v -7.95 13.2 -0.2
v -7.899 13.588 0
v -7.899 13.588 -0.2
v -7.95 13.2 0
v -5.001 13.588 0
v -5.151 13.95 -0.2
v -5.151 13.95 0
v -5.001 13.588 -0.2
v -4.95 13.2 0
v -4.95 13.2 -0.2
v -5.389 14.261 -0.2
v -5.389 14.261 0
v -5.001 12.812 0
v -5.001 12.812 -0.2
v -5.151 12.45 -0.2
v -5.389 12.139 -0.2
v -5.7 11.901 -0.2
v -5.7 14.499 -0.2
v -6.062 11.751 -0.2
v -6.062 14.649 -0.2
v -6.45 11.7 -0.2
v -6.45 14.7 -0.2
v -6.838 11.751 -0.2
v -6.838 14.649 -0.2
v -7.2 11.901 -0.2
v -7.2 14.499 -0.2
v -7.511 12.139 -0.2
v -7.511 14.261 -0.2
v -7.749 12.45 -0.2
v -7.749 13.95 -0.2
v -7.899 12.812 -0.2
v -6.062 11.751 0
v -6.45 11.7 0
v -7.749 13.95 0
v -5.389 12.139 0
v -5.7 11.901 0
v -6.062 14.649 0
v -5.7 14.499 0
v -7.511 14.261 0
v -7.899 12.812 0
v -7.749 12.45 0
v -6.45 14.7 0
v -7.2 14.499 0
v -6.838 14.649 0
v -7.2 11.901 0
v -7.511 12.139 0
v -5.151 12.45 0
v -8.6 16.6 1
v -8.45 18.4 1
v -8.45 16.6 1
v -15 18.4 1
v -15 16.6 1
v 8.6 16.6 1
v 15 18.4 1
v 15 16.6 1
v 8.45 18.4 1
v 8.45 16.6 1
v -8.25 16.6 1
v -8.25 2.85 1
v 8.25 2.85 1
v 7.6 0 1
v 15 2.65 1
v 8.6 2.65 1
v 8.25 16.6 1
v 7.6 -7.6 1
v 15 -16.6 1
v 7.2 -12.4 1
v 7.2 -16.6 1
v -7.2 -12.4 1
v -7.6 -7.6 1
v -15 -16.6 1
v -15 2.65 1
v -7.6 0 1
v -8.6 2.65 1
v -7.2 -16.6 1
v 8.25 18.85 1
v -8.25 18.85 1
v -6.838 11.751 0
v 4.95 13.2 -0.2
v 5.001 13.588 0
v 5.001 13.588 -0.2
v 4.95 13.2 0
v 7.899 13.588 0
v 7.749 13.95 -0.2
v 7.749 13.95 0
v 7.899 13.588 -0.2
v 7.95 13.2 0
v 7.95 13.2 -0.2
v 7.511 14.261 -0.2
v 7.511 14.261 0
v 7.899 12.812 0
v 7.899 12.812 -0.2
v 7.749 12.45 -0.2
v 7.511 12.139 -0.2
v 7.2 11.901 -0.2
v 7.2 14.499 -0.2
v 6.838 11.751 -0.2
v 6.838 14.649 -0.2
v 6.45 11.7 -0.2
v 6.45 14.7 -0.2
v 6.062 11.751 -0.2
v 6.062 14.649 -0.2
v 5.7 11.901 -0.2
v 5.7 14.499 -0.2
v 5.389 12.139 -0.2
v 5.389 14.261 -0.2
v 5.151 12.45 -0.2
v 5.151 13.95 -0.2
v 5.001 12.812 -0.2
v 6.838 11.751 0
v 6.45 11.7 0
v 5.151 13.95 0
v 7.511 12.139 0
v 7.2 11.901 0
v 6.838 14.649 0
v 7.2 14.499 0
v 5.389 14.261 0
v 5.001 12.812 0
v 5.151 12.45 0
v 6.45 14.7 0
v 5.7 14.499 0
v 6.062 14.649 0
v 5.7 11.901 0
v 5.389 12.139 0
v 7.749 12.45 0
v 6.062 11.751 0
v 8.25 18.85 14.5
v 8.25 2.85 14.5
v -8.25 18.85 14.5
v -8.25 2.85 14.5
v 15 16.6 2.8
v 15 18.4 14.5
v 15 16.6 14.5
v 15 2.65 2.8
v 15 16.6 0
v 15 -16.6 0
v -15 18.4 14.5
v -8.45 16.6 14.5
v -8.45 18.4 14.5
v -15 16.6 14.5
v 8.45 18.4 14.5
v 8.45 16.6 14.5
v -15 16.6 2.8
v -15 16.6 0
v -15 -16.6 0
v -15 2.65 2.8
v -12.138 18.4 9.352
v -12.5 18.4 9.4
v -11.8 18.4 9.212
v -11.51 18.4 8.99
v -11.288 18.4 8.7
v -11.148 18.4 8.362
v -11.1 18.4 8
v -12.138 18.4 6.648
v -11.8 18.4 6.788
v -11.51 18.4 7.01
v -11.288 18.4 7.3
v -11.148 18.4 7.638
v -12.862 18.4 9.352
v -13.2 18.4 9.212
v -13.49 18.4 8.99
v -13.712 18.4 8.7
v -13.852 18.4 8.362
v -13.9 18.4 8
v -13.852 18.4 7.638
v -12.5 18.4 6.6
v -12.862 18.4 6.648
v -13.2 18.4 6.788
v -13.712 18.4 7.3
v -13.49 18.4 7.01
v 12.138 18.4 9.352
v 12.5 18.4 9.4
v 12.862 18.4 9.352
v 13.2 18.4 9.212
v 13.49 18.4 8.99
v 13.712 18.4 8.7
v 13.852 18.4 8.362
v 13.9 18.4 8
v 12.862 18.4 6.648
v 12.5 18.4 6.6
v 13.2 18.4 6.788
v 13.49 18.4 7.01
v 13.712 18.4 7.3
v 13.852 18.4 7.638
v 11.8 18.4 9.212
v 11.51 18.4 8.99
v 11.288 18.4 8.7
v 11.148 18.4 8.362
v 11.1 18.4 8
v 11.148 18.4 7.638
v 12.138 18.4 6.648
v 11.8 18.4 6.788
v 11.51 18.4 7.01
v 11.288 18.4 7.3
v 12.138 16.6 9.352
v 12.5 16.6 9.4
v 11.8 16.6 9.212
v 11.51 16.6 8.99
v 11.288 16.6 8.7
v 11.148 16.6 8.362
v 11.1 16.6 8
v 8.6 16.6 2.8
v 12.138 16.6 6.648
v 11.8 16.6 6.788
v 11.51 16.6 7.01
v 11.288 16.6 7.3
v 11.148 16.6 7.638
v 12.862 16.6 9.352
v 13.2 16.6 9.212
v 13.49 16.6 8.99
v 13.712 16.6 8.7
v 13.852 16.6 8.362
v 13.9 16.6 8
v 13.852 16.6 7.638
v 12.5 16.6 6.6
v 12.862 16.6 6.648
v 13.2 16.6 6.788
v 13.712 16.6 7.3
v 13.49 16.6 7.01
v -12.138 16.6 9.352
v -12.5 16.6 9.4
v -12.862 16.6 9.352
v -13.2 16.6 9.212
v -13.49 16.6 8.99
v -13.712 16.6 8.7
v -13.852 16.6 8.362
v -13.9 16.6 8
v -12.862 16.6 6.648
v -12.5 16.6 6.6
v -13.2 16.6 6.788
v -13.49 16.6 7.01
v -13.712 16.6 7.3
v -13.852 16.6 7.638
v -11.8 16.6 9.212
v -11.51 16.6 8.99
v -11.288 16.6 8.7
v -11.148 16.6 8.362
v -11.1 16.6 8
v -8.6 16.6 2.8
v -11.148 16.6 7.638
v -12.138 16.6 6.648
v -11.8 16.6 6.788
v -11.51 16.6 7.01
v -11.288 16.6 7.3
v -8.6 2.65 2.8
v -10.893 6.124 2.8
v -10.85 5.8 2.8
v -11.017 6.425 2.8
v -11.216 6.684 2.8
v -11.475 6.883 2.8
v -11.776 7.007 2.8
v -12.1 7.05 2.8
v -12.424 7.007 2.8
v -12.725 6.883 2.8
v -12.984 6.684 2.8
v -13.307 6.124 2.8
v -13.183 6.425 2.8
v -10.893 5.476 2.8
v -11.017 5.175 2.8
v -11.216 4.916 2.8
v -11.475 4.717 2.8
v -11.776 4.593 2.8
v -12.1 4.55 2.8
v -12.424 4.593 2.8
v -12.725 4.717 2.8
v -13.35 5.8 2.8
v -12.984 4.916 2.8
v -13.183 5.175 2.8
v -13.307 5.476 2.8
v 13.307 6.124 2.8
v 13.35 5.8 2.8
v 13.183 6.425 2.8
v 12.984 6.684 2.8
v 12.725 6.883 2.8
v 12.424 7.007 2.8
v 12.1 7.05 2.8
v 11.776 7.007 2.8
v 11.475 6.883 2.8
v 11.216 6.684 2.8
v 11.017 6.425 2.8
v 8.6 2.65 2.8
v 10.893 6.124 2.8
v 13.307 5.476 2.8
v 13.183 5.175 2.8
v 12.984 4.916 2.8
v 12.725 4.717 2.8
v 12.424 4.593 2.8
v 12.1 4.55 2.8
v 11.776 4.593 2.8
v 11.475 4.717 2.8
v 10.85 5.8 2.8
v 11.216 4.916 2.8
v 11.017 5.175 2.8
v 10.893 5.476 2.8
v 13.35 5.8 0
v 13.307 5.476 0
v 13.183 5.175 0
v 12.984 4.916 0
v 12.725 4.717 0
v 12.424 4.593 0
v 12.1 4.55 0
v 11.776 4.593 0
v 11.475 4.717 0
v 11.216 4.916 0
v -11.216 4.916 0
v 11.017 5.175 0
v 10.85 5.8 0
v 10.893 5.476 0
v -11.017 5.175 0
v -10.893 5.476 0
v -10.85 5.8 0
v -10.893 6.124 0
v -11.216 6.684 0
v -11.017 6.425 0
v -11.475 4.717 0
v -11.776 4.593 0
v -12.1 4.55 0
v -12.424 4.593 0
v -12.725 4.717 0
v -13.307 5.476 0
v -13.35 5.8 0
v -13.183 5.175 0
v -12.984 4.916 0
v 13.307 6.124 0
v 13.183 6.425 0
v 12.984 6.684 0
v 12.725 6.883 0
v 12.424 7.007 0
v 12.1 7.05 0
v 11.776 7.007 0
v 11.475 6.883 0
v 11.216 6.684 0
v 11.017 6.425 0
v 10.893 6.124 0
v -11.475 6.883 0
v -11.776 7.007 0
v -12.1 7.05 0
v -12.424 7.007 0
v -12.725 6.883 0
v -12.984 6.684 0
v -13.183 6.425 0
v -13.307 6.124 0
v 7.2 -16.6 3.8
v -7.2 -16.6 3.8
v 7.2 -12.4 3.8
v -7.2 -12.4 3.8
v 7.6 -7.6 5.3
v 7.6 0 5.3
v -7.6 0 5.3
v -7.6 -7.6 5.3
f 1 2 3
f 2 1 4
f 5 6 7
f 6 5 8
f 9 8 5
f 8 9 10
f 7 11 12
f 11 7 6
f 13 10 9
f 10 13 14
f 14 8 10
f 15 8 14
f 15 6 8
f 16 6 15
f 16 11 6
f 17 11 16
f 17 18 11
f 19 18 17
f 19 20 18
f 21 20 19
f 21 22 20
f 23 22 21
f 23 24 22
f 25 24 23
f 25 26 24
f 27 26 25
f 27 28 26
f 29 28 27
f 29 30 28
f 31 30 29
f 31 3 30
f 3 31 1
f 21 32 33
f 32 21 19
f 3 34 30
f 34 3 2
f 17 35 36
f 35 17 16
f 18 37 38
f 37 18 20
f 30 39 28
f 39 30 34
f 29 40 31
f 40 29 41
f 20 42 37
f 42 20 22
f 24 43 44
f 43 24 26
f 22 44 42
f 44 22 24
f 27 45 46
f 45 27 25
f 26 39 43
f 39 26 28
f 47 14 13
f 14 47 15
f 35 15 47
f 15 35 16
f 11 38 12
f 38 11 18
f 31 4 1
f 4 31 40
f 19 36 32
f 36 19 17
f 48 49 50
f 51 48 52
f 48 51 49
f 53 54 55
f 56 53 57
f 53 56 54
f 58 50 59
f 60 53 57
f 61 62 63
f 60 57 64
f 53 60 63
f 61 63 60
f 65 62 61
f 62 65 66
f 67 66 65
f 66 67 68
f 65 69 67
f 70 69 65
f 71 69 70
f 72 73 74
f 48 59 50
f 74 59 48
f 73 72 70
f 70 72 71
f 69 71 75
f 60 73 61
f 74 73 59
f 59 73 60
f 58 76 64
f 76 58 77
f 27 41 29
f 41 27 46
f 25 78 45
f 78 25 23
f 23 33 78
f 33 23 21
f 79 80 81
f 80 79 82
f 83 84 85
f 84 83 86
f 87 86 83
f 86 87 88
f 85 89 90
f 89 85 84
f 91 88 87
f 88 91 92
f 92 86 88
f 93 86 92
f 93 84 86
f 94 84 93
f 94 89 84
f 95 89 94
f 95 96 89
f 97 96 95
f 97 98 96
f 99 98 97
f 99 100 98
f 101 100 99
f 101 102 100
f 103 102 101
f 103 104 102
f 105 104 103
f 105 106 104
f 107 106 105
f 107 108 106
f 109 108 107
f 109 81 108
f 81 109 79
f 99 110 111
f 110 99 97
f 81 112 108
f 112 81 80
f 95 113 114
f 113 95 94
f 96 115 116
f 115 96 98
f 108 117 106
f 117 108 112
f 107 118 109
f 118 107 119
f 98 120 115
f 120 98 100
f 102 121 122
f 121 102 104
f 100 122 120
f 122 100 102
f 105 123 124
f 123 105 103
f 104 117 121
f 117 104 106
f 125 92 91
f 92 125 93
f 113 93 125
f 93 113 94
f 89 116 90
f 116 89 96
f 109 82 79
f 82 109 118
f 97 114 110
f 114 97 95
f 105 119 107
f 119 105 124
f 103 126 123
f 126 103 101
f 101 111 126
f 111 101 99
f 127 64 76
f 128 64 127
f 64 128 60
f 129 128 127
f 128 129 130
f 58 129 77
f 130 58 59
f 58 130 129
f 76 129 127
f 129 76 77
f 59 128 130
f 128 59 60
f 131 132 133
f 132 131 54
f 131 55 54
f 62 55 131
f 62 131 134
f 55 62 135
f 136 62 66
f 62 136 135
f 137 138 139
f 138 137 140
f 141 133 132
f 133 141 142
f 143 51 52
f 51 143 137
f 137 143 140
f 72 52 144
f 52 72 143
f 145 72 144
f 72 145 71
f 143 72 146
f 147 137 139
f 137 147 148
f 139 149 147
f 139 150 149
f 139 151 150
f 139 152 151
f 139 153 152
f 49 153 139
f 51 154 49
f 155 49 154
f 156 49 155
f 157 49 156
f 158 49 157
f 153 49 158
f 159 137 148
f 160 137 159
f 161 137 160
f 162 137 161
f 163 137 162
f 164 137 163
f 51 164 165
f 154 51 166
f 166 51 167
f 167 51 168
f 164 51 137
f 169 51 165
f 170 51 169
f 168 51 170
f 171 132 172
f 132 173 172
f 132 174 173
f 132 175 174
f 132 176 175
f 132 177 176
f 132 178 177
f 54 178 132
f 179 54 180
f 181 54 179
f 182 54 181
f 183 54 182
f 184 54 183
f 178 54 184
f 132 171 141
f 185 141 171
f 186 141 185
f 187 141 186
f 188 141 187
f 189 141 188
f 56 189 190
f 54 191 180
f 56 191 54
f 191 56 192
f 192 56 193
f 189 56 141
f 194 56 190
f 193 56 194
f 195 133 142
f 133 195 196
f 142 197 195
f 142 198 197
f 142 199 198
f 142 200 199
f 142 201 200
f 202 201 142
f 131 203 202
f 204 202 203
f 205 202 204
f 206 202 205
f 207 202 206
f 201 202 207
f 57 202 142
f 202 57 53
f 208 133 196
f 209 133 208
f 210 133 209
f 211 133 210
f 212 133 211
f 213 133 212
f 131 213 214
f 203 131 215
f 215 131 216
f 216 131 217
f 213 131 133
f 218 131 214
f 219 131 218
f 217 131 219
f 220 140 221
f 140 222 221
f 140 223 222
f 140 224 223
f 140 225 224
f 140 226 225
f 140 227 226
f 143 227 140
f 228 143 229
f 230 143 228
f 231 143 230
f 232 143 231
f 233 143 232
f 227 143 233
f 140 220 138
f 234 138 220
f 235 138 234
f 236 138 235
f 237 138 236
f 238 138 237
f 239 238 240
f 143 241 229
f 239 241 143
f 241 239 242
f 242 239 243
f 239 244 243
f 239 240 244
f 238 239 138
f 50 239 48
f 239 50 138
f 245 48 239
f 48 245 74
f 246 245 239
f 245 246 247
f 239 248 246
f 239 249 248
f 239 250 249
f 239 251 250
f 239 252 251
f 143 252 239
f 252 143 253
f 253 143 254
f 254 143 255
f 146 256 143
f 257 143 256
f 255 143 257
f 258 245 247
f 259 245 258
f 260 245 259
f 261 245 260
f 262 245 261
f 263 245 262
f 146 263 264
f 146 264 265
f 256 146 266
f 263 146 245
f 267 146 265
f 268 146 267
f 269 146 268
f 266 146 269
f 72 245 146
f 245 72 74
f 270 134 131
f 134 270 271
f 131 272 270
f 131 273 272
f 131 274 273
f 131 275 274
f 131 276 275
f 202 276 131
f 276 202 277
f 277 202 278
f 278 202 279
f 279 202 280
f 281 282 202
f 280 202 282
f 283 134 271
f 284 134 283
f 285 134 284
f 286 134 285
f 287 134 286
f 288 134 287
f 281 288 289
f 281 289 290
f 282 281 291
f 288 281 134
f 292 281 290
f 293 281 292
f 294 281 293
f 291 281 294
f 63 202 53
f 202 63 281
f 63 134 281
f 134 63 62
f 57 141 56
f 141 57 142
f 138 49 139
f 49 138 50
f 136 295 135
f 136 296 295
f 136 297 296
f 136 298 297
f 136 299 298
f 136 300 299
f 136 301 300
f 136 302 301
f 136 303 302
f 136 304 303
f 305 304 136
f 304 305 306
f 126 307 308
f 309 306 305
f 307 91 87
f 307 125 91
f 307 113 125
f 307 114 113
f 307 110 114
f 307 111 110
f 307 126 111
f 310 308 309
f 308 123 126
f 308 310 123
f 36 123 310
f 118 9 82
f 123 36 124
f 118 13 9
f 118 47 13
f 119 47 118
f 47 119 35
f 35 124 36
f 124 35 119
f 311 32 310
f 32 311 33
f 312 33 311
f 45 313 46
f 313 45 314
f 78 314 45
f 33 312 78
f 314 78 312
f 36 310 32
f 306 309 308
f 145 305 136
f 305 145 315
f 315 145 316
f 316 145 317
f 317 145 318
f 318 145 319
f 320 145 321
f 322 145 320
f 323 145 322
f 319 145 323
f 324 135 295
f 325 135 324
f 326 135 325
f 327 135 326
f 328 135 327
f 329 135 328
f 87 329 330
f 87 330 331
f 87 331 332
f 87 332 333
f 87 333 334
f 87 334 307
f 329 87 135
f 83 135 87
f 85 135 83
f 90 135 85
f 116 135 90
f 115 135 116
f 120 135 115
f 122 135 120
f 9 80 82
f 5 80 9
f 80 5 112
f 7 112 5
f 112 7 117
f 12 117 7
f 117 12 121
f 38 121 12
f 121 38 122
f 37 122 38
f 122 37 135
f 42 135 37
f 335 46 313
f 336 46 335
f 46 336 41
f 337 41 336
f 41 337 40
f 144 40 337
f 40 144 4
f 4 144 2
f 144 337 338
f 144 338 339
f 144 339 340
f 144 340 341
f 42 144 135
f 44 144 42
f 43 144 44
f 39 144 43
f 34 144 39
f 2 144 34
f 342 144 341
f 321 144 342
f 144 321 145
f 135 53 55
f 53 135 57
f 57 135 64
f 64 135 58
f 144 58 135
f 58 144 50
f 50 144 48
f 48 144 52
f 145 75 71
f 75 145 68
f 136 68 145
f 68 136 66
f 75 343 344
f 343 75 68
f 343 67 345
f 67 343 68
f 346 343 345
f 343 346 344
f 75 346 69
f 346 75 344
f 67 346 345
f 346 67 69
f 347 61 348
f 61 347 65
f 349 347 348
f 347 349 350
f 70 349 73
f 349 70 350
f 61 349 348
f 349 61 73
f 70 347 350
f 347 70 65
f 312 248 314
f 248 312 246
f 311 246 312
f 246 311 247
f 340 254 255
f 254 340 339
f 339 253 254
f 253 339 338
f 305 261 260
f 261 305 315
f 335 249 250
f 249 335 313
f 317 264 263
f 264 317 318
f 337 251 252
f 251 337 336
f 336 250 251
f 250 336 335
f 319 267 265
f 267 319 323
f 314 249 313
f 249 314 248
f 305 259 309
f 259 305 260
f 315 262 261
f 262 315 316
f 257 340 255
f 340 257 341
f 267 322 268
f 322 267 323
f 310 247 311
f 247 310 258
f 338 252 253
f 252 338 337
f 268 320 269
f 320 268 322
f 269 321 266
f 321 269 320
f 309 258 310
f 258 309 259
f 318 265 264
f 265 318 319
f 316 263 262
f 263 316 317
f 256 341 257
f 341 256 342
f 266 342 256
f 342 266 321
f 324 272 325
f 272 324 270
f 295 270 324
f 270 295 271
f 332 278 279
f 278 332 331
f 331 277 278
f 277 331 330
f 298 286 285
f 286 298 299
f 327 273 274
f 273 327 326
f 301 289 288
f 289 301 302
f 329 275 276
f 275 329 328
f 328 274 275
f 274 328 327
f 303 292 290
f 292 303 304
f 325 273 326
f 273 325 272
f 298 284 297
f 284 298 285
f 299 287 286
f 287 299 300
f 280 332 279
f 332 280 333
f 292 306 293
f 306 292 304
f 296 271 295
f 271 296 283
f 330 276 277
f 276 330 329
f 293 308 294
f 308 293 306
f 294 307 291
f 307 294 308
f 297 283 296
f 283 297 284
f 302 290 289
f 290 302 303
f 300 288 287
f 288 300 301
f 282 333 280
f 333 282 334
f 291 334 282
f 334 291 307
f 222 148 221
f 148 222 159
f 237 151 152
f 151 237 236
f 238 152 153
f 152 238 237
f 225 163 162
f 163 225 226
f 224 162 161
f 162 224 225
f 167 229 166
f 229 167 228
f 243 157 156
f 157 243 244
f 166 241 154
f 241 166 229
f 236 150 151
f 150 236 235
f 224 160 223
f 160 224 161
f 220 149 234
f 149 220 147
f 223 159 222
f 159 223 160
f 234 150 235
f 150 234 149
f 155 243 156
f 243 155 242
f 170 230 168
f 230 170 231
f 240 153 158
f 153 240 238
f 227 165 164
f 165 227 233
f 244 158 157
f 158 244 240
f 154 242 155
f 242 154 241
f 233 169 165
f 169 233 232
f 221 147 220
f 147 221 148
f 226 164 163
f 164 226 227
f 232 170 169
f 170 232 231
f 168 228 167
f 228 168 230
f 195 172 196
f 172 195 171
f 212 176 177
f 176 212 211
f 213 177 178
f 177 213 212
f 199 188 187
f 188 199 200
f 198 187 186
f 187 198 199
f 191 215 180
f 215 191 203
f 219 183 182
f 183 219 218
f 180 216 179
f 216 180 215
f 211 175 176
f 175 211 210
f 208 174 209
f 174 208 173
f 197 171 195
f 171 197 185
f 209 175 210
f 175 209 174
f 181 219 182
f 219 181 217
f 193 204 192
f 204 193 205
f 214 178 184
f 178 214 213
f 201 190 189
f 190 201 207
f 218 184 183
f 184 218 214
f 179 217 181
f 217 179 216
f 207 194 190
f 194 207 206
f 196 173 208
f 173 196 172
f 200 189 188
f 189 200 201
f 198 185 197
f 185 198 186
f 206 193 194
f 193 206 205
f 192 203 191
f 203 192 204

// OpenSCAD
// file: smidge.scad
//
// Copyright (c) Stewart H. Whitman, 2020-2021.
//
// File:    smidge.scad
// Project: General
// License: CC BY-NC-SA 4.0 (Attribution-NonCommercial-ShareAlike)
// Desc:    SMIDGE constant used in preview mode.
//

// Smidge constant for rendering only (to avoid Z-axis fighting, etc.)
SMIDGE = $preview ? 0.01 : 0;
// main file
//
// Copyright (c) Stewart H. Whitman, 2024.
//
// File:    youyeetoo-nic.scad
// Project: Dell Wyse 5070 2nd Ethernet Adapter Adapter
// License: CC BY-NC-SA 4.0 (Attribution-NonCommercial-ShareAlike)
// Desc:    Mock-up of the Youyeetoo Intel i225V B3/i226 M.2 NIC
//

include <smidge.scad>;

// Youyeetoo Intel I225-V B3/I226 M.2 Daughter board layout
// Part #: IIO-ALAN4 (M.2 A+E Key 2230)
//
// N.B.: Based on various pictures, there are at least two
// different daughter boards associated with this NIC/Part:
//   - a Pulse chip + black shield /w small holes deeper on PCB
//   - a Fuwin chip + silver shield /w larger holes shallower on PCB
// This file matches the layout of the one with the Pulse chip.
//
// This NIC is an M.2 A+E 2230 with a Intel I225V/I226 2.5GB NIC
// and a daughter board connected by a small cable. The cable is
// available in various lengths from 10cm to 30cm; I used a 15cm
// cable for the Wyse 5070.
//
// It is available from the Youyeetoo store:
//   https://www.youyeetoo.com/products/25g-m2-ethernet-card?VariantsId=12274
// or Aliexpress:
//   https://www.aliexpress.com/item/3256807086898768.html
// And made for one of their SBCs.
//
// Most of values come from the measurements available
// on their site - missing items were measured. The
// components/holes are symmetric about the Y-axis (side<->side),
// so some values are calculated accordingly.
//
// The shield holes match the layout of DE-9/DE-15 (9-pin
// serial or 15-pin vga) connector, and in fact it can be
// mounted in a serial or VGA cutout with the supplied hardware.
//

// kind:
//
// Unique, for customization.
//
function nic_kind() = "youyeetoo";

// pcb thickness ~1.0mm
// pcb length (measured) X width (measured)
function nic_get_pcb_size() = [ 30, 33.2, 1.0 ];

// ethernet size [left<->right,front<->rear,top<->bottom]
// Close match: Kycon, Inc. GWLX-SMT-S988G/Y
//              https://www.digikey.com/en/products/detail/kycon-inc/GWLX-SMT-S988G-Y/10248051
// Height x Width: Drawing says 17.2x13.9 (maybe includes EMI fingers), measured about 16.5x13.5 (excluding EMI fingers)
function nic_get_ethernet_size() = [16.5,16,13.5];

// shield: thickness (including bend radius)
function nic_get_shield_thickness() = 1.8;
// shield: size
function nic_get_shield_size() = [ nic_get_pcb_size().x, nic_get_shield_thickness(), nic_get_ethernet_size().z ];
// shield hole position (25mm apart per DE-9 standard) [ left=0, bottom of pcb=0]
function _nic_get_shield_left_hole() = [ nic_get_shield_size().x/2-12.5, 7.0+nic_get_pcb_size().z ];
function _nic_get_shield_right_hole() = [ nic_get_shield_size().x/2+12.5, 7.0+nic_get_pcb_size().z ];
function nic_get_shield_holes() = [ _nic_get_shield_left_hole(), _nic_get_shield_right_hole() ];
// shield hole diameter (measures about 2.8mm)
function nic_get_shield_hole_diameter() = 2.8;
function nic_get_shield_z() = nic_get_pcb_size().z;
function nic_get_shield_center_pos() = [ nic_get_pcb_size().x/2, nic_get_shield_size().z/2+nic_get_shield_z() ];

// ethernet position is equidistant from left or right side
function _nic_get_ethernet_left_pos() = (nic_get_pcb_size().x - nic_get_ethernet_size().x)/2;
function _nic_get_ethernet_right_pos() = (nic_get_pcb_size().x + nic_get_ethernet_size().x)/2;
// N.B.... about 0.0mm between ethernet and PCB
function _nic_get_ethernet_bottom_pos() = nic_get_pcb_size().z + 0.0;
function nic_get_ethernet_center_pos() = [ (_nic_get_ethernet_left_pos()+_nic_get_ethernet_right_pos())/2, _nic_get_ethernet_bottom_pos() + nic_get_ethernet_size().z/2 ];
function nic_get_ethernet_projection() = 12.75-10.5;

// bottom hole positions [left=0, rear=0] - equidistant from both sides
function _nic_get_left_hole() = [ nic_get_pcb_size().x/2 - 24.2/2, nic_get_pcb_size().y - 10.8];
function _nic_get_right_hole() = [ nic_get_pcb_size().x/2 + 24.2/2, nic_get_pcb_size().y - 10.8];
function nic_get_bottom_holes() = [ _nic_get_left_hole(), _nic_get_right_hole() ];
// bottom hole diameter (measures about 2.5mm, diagram says 2mm - screw size)
function nic_get_bottom_hole_diameter() = 2.5;

// Layout of the nic board (PCB centered with NIC port hanging out)
module nic(transparency=1.0,center=true,with_shield=true) {
  shield_thickness = nic_get_shield_thickness();

  module hole(height,diameter) {
    translate( [0,0,-SMIDGE] ) cylinder( h = height+2*SMIDGE, d=diameter );
  } // end hole

  // pcb
  module pcb() {
    color( "green", transparency ) cube( nic_get_pcb_size() );
  } // end pcb

  // ethernet
  module ethernet() {
    // connector
    color( "silver", transparency )
      translate( [_nic_get_ethernet_left_pos(), nic_get_pcb_size().y-nic_get_ethernet_size().y+nic_get_ethernet_projection(), _nic_get_ethernet_bottom_pos()] )
        cube( nic_get_ethernet_size() );
    // nubs securing connector below bottom
    color( "black", transparency ) {
      h = _nic_get_ethernet_bottom_pos()+0.2;
      translate( [_nic_get_ethernet_left_pos()+1.8,nic_get_pcb_size().y-3.4,_nic_get_ethernet_bottom_pos()-h] ) cylinder( h=h, d=3.00 );
      translate( [_nic_get_ethernet_right_pos()-1.8,nic_get_pcb_size().y-3.4,_nic_get_ethernet_bottom_pos()-h] ) cylinder( h=h, d=3.00 );
    }
  } // end ethernet

  // shield
  module shield() {
    shield_holder    = [ 6.4, 0.2+nic_get_ethernet_size().y-nic_get_ethernet_projection(), shield_thickness ];
    shield_left_pos  = [ (nic_get_pcb_size().x-nic_get_shield_size().x)/2, nic_get_pcb_size().y, nic_get_shield_z() ];
    shield_right_pos = [ shield_left_pos.x+nic_get_shield_size().x, nic_get_pcb_size().y, nic_get_shield_z() ];
    color( "black", transparency )
      difference() {
	 union() {
	    translate( shield_left_pos ) cube( nic_get_shield_size() );
	    translate( shield_left_pos-[0,shield_holder.y,0] ) cube( shield_holder );
	    translate( shield_right_pos-[shield_holder.x,shield_holder.y,0] ) cube( shield_holder );
	  }
	// Cutout ethernet hole...
	o = 0.2;
	translate( [_nic_get_ethernet_left_pos()-o,nic_get_pcb_size().y-nic_get_ethernet_size().y+nic_get_ethernet_projection(),_nic_get_ethernet_bottom_pos()-o] )
	  cube( nic_get_ethernet_size() + 2*[o,o,o] );
      }
  } // end shield

  // header_ja: wiring connector
  module header_ja() {
    // 12-pin @ about 1mm pitch
    header_size = [ 14.4, 4.2, 2.8 ];
    color( "white", transparency )
      translate( [ nic_get_pcb_size().x/2 - header_size.x/2, 0, nic_get_pcb_size().z ] ) cube( header_size );
  } // end header_ja

  // mags: Pulse H5084NL chip
  module mags() {
    mag_size = [ 15.2, 7.6, 4.1+nic_get_pcb_size().z ];
    color( "black", transparency )
      translate( [ nic_get_pcb_size().x/2 - mag_size.x/2, 9, +0.2 ] ) cube( mag_size );
  } // end mags

  // entire nic
  translate( center ? -[nic_get_pcb_size().x,nic_get_pcb_size().y,0]/2 : [0,0,0] ) {
    difference() {
      union() {
	pcb();
	ethernet();
	header_ja();
	mags();

        if( with_shield )
	  shield();
      }

      // Bottom Holes (left and right)
      for( h = nic_get_bottom_holes() )
	translate( concat( h, -shield_thickness ) ) hole( nic_get_pcb_size().z + 2*shield_thickness, nic_get_bottom_hole_diameter() );

      // Vertical Holes (left and right)
      if( with_shield )
	for( h = nic_get_shield_holes() )
	  translate( [h.x, nic_get_pcb_size().y + shield_thickness, h.y] ) rotate( [90,0,0] ) hole( shield_thickness, nic_get_shield_hole_diameter() );
    }
  }
} // end nic

nic($fn=24);
